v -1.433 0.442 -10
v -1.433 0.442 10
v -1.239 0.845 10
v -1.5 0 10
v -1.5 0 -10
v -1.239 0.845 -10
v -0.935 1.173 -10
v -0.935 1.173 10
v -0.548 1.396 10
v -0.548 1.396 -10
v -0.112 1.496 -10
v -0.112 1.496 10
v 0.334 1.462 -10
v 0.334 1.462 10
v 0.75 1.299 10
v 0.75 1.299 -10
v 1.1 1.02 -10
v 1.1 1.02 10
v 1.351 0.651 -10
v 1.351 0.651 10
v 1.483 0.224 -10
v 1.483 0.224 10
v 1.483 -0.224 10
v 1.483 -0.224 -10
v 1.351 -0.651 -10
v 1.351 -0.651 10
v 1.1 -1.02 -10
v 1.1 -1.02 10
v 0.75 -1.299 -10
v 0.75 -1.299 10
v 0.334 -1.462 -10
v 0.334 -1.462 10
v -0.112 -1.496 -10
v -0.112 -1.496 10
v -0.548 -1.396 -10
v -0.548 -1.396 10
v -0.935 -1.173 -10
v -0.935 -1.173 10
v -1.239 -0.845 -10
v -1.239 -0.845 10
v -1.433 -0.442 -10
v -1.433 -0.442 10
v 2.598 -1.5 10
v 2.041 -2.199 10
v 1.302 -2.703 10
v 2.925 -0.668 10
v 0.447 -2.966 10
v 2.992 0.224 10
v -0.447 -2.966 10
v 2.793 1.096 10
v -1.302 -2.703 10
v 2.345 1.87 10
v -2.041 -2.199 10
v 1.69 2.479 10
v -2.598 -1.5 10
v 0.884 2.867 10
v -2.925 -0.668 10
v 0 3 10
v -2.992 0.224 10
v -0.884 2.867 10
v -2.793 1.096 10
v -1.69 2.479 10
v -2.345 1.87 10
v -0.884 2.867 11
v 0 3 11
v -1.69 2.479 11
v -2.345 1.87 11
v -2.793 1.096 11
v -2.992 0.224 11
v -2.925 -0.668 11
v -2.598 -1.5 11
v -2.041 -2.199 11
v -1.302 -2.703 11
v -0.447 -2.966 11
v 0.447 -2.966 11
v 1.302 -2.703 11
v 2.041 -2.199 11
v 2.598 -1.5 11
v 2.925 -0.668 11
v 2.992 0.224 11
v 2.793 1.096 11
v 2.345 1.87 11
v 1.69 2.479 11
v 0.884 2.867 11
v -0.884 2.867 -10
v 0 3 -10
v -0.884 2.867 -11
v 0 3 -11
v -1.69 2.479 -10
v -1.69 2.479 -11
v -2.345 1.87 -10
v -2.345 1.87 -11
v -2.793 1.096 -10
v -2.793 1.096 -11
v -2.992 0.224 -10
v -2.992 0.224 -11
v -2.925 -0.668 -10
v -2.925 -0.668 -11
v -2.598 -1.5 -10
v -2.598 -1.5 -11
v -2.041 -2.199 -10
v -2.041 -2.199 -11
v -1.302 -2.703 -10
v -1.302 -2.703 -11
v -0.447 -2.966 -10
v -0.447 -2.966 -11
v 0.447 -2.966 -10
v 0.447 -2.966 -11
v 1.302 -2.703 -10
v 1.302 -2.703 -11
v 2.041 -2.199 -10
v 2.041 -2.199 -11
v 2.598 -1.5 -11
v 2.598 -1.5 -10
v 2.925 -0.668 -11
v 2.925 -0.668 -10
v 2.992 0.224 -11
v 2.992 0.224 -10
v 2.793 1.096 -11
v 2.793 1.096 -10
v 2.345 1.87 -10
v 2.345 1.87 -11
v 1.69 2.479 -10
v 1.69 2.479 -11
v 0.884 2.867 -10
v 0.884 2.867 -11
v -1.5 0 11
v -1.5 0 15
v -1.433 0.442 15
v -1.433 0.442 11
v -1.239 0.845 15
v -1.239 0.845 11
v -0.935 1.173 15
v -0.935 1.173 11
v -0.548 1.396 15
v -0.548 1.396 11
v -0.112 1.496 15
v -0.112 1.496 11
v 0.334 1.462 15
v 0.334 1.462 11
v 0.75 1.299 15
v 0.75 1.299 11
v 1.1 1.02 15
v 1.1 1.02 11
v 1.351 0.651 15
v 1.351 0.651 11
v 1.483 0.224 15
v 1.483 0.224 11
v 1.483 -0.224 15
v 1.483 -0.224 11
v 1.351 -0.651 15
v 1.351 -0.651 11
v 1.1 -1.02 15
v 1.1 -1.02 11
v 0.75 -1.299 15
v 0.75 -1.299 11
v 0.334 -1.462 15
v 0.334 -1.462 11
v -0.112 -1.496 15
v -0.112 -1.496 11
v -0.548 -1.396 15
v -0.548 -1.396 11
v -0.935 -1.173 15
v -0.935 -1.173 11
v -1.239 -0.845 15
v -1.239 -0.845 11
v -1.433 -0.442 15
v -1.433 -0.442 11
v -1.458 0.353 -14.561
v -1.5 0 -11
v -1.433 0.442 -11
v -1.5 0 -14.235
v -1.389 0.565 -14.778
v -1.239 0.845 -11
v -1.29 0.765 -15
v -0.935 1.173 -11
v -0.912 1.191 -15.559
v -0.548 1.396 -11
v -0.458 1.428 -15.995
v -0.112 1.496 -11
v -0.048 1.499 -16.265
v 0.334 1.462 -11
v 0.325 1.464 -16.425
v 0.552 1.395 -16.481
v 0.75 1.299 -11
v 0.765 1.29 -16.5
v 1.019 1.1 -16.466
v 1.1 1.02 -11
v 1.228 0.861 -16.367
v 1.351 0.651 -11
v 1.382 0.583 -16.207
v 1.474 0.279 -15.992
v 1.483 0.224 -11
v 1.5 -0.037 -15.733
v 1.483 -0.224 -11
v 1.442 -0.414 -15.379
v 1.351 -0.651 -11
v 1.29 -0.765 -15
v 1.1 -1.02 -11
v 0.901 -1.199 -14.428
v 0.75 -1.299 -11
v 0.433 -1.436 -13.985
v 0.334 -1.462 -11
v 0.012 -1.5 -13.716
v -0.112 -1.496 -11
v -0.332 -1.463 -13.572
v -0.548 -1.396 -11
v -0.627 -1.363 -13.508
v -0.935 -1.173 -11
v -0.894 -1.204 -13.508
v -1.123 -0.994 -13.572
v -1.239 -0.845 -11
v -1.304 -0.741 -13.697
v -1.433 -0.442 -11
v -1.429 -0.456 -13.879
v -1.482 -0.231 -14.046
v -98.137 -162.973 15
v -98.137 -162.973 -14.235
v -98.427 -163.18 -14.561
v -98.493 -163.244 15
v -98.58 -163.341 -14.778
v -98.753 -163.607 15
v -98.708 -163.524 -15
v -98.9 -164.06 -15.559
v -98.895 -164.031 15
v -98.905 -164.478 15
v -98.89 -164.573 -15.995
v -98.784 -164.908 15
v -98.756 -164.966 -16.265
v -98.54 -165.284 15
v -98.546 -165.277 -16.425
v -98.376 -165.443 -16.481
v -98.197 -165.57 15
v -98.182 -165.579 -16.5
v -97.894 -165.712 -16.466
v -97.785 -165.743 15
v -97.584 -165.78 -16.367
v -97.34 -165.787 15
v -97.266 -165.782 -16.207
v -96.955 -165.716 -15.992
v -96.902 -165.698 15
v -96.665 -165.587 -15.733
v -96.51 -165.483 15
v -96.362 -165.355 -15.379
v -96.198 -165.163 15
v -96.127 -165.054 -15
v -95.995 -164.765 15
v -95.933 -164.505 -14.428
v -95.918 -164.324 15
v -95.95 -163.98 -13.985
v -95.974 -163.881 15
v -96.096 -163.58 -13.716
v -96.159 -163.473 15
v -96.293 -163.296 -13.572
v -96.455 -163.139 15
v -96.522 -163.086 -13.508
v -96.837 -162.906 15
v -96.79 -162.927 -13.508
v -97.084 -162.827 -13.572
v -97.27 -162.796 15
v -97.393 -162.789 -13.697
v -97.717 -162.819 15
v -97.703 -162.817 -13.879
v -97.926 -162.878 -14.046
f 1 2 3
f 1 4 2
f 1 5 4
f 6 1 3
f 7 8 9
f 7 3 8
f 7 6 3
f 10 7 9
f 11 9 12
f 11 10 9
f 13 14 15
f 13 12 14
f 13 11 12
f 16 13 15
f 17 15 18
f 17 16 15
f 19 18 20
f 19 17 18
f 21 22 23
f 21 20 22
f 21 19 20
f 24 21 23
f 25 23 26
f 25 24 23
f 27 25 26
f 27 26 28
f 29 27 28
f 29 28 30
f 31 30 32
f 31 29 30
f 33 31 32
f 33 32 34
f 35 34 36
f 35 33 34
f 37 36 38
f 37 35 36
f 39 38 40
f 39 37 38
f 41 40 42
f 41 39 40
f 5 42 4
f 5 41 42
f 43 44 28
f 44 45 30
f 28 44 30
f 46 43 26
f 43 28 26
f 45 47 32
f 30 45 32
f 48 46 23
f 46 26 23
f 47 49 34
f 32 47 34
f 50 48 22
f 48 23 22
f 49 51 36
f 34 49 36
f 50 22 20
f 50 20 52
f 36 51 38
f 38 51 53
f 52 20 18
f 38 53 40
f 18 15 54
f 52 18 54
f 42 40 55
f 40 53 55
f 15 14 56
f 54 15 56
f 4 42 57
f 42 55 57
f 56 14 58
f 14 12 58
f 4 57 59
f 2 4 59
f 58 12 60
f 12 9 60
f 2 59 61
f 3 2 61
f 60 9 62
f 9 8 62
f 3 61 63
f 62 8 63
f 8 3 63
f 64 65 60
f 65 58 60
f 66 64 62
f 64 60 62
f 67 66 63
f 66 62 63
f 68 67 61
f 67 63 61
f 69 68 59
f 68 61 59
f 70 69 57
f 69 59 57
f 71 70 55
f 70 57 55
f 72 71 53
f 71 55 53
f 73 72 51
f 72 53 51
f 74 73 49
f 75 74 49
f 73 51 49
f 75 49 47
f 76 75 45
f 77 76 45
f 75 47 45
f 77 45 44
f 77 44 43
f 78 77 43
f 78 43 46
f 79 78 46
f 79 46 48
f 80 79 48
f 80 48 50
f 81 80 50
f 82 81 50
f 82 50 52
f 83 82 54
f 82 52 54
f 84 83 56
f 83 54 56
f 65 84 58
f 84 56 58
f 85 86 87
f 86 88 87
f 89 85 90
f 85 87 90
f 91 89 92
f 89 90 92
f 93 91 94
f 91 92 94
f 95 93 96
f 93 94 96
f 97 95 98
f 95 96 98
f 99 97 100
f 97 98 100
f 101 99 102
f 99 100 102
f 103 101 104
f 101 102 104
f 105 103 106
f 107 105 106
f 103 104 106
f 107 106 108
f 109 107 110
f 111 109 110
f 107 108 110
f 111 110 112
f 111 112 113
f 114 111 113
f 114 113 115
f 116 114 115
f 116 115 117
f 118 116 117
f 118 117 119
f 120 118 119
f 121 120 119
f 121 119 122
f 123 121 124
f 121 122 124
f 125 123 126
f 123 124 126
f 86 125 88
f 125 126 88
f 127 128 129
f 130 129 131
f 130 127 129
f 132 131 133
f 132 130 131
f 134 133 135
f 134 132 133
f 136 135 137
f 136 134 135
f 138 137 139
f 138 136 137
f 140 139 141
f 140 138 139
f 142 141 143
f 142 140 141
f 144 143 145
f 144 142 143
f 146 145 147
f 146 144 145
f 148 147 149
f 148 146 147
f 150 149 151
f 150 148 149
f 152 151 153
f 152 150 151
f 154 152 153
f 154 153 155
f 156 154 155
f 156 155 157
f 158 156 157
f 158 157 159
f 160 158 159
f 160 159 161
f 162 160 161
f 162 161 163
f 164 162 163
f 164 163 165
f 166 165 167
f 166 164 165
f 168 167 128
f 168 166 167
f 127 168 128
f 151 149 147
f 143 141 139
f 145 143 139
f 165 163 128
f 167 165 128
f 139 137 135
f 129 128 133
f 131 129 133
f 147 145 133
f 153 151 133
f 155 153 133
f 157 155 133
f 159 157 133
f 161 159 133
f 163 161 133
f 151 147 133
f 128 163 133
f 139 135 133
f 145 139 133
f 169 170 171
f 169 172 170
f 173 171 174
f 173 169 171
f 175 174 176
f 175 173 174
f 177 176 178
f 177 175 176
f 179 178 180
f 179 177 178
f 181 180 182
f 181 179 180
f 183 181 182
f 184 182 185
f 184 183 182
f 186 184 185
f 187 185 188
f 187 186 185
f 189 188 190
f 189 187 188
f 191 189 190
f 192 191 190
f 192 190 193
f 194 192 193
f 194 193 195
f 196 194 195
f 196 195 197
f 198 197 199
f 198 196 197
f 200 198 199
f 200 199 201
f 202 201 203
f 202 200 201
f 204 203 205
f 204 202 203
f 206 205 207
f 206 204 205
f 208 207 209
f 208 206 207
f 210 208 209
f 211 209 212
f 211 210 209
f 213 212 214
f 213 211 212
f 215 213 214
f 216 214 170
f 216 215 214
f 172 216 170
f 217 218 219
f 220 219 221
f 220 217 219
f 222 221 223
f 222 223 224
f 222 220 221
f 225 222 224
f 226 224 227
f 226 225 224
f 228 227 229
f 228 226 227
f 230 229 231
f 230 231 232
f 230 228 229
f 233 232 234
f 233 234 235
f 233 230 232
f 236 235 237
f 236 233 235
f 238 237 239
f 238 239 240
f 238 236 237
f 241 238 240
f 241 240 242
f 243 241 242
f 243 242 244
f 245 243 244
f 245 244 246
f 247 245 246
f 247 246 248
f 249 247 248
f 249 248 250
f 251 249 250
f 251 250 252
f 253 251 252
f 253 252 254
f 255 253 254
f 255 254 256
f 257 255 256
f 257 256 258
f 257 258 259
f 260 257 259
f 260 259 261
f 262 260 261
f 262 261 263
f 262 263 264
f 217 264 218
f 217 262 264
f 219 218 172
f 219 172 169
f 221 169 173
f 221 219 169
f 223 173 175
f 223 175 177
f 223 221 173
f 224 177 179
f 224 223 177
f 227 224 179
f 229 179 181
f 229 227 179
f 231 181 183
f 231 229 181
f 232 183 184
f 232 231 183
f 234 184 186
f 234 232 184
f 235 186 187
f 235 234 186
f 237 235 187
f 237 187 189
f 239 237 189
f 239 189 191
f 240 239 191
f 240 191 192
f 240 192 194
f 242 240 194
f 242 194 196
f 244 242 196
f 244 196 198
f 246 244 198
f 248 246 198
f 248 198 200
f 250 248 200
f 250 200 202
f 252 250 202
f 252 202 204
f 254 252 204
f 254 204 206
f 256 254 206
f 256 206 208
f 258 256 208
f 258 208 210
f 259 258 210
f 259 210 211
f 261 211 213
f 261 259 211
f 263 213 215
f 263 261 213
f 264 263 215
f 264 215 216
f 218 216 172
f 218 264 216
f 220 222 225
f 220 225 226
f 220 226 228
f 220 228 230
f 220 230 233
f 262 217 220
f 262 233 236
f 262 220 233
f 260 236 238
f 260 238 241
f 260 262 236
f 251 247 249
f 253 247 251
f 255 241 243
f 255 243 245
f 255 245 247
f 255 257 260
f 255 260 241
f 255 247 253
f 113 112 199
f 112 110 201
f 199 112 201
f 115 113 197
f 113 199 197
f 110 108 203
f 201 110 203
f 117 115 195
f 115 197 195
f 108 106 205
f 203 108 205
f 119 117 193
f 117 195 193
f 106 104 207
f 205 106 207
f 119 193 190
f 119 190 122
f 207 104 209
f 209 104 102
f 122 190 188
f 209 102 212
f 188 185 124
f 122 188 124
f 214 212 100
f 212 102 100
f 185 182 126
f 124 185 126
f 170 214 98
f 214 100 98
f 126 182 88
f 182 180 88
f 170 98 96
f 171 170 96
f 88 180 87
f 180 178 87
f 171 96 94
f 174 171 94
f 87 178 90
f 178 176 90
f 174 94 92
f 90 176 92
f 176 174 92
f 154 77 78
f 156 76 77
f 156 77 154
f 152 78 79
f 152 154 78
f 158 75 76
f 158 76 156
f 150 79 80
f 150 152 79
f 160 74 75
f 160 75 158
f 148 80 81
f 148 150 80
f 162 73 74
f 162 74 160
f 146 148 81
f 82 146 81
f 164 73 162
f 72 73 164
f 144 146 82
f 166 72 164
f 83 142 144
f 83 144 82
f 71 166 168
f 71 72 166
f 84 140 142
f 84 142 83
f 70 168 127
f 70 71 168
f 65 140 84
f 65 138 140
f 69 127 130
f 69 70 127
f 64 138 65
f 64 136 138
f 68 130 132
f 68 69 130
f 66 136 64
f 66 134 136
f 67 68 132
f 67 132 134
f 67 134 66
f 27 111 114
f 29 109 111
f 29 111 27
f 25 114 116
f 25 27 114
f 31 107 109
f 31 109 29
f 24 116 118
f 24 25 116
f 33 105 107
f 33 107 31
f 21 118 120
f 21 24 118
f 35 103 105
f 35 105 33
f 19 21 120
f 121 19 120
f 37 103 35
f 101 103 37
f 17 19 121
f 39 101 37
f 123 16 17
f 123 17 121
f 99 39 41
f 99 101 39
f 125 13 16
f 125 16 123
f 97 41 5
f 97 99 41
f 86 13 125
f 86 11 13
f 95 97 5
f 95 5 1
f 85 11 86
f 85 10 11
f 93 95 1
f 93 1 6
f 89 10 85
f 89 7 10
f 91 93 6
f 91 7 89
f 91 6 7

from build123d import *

# Parameters (mm, degrees)
ESQUISSE4_R = 1.5
ESQUISSE5_W = 1.5
ESQUISSE5_H = 1


with BuildPart() as part:
    # Balayage1: sweep along a path in Esquisse3
    with BuildLine(Plane(origin=(0, 0, 0), x_dir=(-0.5100376925115994, -0.8601520518009844, 0), z_dir=(0.8601520518009843, -0.5100376925115992, 0))) as balayage1_path:
        Line((0, -15), (0, 15))
        Line((0, 15), (191.00019974, 15))
        Line((191.00019974, 15), (191.00019974, -15))
    # Esquisse4 → Balayage1 (sweep)
    with BuildSketch(Plane(origin=(0, 0, 15), x_dir=(-1, 0, 0), z_dir=(0, 0, -1))):
        Circle(ESQUISSE4_R)
    sweep(path=balayage1_path.line, transition=Transition.RIGHT)

    # Esquisse5 → Révolution1 (revolve)
    with BuildSketch(Plane(origin=(0, 0, 0), x_dir=(-0.5100376925115994, -0.8601520518009844, 0), z_dir=(0.8601520518009843, -0.5100376925115992, 0)), mode=Mode.PRIVATE) as r_volution1_sk:
        with Locations((-2.25, -10.5)):
            Rectangle(ESQUISSE5_W, ESQUISSE5_H)
        with Locations((-2.25, 10.5)):
            Rectangle(ESQUISSE5_W, ESQUISSE5_H)
    revolve(r_volution1_sk.sketch.rotate(Axis((0, 0, -11), (0, 0, 1)), 30.666340454), axis=Axis((0, 0, -11), (0, 0, 1)))


solid = part.part
